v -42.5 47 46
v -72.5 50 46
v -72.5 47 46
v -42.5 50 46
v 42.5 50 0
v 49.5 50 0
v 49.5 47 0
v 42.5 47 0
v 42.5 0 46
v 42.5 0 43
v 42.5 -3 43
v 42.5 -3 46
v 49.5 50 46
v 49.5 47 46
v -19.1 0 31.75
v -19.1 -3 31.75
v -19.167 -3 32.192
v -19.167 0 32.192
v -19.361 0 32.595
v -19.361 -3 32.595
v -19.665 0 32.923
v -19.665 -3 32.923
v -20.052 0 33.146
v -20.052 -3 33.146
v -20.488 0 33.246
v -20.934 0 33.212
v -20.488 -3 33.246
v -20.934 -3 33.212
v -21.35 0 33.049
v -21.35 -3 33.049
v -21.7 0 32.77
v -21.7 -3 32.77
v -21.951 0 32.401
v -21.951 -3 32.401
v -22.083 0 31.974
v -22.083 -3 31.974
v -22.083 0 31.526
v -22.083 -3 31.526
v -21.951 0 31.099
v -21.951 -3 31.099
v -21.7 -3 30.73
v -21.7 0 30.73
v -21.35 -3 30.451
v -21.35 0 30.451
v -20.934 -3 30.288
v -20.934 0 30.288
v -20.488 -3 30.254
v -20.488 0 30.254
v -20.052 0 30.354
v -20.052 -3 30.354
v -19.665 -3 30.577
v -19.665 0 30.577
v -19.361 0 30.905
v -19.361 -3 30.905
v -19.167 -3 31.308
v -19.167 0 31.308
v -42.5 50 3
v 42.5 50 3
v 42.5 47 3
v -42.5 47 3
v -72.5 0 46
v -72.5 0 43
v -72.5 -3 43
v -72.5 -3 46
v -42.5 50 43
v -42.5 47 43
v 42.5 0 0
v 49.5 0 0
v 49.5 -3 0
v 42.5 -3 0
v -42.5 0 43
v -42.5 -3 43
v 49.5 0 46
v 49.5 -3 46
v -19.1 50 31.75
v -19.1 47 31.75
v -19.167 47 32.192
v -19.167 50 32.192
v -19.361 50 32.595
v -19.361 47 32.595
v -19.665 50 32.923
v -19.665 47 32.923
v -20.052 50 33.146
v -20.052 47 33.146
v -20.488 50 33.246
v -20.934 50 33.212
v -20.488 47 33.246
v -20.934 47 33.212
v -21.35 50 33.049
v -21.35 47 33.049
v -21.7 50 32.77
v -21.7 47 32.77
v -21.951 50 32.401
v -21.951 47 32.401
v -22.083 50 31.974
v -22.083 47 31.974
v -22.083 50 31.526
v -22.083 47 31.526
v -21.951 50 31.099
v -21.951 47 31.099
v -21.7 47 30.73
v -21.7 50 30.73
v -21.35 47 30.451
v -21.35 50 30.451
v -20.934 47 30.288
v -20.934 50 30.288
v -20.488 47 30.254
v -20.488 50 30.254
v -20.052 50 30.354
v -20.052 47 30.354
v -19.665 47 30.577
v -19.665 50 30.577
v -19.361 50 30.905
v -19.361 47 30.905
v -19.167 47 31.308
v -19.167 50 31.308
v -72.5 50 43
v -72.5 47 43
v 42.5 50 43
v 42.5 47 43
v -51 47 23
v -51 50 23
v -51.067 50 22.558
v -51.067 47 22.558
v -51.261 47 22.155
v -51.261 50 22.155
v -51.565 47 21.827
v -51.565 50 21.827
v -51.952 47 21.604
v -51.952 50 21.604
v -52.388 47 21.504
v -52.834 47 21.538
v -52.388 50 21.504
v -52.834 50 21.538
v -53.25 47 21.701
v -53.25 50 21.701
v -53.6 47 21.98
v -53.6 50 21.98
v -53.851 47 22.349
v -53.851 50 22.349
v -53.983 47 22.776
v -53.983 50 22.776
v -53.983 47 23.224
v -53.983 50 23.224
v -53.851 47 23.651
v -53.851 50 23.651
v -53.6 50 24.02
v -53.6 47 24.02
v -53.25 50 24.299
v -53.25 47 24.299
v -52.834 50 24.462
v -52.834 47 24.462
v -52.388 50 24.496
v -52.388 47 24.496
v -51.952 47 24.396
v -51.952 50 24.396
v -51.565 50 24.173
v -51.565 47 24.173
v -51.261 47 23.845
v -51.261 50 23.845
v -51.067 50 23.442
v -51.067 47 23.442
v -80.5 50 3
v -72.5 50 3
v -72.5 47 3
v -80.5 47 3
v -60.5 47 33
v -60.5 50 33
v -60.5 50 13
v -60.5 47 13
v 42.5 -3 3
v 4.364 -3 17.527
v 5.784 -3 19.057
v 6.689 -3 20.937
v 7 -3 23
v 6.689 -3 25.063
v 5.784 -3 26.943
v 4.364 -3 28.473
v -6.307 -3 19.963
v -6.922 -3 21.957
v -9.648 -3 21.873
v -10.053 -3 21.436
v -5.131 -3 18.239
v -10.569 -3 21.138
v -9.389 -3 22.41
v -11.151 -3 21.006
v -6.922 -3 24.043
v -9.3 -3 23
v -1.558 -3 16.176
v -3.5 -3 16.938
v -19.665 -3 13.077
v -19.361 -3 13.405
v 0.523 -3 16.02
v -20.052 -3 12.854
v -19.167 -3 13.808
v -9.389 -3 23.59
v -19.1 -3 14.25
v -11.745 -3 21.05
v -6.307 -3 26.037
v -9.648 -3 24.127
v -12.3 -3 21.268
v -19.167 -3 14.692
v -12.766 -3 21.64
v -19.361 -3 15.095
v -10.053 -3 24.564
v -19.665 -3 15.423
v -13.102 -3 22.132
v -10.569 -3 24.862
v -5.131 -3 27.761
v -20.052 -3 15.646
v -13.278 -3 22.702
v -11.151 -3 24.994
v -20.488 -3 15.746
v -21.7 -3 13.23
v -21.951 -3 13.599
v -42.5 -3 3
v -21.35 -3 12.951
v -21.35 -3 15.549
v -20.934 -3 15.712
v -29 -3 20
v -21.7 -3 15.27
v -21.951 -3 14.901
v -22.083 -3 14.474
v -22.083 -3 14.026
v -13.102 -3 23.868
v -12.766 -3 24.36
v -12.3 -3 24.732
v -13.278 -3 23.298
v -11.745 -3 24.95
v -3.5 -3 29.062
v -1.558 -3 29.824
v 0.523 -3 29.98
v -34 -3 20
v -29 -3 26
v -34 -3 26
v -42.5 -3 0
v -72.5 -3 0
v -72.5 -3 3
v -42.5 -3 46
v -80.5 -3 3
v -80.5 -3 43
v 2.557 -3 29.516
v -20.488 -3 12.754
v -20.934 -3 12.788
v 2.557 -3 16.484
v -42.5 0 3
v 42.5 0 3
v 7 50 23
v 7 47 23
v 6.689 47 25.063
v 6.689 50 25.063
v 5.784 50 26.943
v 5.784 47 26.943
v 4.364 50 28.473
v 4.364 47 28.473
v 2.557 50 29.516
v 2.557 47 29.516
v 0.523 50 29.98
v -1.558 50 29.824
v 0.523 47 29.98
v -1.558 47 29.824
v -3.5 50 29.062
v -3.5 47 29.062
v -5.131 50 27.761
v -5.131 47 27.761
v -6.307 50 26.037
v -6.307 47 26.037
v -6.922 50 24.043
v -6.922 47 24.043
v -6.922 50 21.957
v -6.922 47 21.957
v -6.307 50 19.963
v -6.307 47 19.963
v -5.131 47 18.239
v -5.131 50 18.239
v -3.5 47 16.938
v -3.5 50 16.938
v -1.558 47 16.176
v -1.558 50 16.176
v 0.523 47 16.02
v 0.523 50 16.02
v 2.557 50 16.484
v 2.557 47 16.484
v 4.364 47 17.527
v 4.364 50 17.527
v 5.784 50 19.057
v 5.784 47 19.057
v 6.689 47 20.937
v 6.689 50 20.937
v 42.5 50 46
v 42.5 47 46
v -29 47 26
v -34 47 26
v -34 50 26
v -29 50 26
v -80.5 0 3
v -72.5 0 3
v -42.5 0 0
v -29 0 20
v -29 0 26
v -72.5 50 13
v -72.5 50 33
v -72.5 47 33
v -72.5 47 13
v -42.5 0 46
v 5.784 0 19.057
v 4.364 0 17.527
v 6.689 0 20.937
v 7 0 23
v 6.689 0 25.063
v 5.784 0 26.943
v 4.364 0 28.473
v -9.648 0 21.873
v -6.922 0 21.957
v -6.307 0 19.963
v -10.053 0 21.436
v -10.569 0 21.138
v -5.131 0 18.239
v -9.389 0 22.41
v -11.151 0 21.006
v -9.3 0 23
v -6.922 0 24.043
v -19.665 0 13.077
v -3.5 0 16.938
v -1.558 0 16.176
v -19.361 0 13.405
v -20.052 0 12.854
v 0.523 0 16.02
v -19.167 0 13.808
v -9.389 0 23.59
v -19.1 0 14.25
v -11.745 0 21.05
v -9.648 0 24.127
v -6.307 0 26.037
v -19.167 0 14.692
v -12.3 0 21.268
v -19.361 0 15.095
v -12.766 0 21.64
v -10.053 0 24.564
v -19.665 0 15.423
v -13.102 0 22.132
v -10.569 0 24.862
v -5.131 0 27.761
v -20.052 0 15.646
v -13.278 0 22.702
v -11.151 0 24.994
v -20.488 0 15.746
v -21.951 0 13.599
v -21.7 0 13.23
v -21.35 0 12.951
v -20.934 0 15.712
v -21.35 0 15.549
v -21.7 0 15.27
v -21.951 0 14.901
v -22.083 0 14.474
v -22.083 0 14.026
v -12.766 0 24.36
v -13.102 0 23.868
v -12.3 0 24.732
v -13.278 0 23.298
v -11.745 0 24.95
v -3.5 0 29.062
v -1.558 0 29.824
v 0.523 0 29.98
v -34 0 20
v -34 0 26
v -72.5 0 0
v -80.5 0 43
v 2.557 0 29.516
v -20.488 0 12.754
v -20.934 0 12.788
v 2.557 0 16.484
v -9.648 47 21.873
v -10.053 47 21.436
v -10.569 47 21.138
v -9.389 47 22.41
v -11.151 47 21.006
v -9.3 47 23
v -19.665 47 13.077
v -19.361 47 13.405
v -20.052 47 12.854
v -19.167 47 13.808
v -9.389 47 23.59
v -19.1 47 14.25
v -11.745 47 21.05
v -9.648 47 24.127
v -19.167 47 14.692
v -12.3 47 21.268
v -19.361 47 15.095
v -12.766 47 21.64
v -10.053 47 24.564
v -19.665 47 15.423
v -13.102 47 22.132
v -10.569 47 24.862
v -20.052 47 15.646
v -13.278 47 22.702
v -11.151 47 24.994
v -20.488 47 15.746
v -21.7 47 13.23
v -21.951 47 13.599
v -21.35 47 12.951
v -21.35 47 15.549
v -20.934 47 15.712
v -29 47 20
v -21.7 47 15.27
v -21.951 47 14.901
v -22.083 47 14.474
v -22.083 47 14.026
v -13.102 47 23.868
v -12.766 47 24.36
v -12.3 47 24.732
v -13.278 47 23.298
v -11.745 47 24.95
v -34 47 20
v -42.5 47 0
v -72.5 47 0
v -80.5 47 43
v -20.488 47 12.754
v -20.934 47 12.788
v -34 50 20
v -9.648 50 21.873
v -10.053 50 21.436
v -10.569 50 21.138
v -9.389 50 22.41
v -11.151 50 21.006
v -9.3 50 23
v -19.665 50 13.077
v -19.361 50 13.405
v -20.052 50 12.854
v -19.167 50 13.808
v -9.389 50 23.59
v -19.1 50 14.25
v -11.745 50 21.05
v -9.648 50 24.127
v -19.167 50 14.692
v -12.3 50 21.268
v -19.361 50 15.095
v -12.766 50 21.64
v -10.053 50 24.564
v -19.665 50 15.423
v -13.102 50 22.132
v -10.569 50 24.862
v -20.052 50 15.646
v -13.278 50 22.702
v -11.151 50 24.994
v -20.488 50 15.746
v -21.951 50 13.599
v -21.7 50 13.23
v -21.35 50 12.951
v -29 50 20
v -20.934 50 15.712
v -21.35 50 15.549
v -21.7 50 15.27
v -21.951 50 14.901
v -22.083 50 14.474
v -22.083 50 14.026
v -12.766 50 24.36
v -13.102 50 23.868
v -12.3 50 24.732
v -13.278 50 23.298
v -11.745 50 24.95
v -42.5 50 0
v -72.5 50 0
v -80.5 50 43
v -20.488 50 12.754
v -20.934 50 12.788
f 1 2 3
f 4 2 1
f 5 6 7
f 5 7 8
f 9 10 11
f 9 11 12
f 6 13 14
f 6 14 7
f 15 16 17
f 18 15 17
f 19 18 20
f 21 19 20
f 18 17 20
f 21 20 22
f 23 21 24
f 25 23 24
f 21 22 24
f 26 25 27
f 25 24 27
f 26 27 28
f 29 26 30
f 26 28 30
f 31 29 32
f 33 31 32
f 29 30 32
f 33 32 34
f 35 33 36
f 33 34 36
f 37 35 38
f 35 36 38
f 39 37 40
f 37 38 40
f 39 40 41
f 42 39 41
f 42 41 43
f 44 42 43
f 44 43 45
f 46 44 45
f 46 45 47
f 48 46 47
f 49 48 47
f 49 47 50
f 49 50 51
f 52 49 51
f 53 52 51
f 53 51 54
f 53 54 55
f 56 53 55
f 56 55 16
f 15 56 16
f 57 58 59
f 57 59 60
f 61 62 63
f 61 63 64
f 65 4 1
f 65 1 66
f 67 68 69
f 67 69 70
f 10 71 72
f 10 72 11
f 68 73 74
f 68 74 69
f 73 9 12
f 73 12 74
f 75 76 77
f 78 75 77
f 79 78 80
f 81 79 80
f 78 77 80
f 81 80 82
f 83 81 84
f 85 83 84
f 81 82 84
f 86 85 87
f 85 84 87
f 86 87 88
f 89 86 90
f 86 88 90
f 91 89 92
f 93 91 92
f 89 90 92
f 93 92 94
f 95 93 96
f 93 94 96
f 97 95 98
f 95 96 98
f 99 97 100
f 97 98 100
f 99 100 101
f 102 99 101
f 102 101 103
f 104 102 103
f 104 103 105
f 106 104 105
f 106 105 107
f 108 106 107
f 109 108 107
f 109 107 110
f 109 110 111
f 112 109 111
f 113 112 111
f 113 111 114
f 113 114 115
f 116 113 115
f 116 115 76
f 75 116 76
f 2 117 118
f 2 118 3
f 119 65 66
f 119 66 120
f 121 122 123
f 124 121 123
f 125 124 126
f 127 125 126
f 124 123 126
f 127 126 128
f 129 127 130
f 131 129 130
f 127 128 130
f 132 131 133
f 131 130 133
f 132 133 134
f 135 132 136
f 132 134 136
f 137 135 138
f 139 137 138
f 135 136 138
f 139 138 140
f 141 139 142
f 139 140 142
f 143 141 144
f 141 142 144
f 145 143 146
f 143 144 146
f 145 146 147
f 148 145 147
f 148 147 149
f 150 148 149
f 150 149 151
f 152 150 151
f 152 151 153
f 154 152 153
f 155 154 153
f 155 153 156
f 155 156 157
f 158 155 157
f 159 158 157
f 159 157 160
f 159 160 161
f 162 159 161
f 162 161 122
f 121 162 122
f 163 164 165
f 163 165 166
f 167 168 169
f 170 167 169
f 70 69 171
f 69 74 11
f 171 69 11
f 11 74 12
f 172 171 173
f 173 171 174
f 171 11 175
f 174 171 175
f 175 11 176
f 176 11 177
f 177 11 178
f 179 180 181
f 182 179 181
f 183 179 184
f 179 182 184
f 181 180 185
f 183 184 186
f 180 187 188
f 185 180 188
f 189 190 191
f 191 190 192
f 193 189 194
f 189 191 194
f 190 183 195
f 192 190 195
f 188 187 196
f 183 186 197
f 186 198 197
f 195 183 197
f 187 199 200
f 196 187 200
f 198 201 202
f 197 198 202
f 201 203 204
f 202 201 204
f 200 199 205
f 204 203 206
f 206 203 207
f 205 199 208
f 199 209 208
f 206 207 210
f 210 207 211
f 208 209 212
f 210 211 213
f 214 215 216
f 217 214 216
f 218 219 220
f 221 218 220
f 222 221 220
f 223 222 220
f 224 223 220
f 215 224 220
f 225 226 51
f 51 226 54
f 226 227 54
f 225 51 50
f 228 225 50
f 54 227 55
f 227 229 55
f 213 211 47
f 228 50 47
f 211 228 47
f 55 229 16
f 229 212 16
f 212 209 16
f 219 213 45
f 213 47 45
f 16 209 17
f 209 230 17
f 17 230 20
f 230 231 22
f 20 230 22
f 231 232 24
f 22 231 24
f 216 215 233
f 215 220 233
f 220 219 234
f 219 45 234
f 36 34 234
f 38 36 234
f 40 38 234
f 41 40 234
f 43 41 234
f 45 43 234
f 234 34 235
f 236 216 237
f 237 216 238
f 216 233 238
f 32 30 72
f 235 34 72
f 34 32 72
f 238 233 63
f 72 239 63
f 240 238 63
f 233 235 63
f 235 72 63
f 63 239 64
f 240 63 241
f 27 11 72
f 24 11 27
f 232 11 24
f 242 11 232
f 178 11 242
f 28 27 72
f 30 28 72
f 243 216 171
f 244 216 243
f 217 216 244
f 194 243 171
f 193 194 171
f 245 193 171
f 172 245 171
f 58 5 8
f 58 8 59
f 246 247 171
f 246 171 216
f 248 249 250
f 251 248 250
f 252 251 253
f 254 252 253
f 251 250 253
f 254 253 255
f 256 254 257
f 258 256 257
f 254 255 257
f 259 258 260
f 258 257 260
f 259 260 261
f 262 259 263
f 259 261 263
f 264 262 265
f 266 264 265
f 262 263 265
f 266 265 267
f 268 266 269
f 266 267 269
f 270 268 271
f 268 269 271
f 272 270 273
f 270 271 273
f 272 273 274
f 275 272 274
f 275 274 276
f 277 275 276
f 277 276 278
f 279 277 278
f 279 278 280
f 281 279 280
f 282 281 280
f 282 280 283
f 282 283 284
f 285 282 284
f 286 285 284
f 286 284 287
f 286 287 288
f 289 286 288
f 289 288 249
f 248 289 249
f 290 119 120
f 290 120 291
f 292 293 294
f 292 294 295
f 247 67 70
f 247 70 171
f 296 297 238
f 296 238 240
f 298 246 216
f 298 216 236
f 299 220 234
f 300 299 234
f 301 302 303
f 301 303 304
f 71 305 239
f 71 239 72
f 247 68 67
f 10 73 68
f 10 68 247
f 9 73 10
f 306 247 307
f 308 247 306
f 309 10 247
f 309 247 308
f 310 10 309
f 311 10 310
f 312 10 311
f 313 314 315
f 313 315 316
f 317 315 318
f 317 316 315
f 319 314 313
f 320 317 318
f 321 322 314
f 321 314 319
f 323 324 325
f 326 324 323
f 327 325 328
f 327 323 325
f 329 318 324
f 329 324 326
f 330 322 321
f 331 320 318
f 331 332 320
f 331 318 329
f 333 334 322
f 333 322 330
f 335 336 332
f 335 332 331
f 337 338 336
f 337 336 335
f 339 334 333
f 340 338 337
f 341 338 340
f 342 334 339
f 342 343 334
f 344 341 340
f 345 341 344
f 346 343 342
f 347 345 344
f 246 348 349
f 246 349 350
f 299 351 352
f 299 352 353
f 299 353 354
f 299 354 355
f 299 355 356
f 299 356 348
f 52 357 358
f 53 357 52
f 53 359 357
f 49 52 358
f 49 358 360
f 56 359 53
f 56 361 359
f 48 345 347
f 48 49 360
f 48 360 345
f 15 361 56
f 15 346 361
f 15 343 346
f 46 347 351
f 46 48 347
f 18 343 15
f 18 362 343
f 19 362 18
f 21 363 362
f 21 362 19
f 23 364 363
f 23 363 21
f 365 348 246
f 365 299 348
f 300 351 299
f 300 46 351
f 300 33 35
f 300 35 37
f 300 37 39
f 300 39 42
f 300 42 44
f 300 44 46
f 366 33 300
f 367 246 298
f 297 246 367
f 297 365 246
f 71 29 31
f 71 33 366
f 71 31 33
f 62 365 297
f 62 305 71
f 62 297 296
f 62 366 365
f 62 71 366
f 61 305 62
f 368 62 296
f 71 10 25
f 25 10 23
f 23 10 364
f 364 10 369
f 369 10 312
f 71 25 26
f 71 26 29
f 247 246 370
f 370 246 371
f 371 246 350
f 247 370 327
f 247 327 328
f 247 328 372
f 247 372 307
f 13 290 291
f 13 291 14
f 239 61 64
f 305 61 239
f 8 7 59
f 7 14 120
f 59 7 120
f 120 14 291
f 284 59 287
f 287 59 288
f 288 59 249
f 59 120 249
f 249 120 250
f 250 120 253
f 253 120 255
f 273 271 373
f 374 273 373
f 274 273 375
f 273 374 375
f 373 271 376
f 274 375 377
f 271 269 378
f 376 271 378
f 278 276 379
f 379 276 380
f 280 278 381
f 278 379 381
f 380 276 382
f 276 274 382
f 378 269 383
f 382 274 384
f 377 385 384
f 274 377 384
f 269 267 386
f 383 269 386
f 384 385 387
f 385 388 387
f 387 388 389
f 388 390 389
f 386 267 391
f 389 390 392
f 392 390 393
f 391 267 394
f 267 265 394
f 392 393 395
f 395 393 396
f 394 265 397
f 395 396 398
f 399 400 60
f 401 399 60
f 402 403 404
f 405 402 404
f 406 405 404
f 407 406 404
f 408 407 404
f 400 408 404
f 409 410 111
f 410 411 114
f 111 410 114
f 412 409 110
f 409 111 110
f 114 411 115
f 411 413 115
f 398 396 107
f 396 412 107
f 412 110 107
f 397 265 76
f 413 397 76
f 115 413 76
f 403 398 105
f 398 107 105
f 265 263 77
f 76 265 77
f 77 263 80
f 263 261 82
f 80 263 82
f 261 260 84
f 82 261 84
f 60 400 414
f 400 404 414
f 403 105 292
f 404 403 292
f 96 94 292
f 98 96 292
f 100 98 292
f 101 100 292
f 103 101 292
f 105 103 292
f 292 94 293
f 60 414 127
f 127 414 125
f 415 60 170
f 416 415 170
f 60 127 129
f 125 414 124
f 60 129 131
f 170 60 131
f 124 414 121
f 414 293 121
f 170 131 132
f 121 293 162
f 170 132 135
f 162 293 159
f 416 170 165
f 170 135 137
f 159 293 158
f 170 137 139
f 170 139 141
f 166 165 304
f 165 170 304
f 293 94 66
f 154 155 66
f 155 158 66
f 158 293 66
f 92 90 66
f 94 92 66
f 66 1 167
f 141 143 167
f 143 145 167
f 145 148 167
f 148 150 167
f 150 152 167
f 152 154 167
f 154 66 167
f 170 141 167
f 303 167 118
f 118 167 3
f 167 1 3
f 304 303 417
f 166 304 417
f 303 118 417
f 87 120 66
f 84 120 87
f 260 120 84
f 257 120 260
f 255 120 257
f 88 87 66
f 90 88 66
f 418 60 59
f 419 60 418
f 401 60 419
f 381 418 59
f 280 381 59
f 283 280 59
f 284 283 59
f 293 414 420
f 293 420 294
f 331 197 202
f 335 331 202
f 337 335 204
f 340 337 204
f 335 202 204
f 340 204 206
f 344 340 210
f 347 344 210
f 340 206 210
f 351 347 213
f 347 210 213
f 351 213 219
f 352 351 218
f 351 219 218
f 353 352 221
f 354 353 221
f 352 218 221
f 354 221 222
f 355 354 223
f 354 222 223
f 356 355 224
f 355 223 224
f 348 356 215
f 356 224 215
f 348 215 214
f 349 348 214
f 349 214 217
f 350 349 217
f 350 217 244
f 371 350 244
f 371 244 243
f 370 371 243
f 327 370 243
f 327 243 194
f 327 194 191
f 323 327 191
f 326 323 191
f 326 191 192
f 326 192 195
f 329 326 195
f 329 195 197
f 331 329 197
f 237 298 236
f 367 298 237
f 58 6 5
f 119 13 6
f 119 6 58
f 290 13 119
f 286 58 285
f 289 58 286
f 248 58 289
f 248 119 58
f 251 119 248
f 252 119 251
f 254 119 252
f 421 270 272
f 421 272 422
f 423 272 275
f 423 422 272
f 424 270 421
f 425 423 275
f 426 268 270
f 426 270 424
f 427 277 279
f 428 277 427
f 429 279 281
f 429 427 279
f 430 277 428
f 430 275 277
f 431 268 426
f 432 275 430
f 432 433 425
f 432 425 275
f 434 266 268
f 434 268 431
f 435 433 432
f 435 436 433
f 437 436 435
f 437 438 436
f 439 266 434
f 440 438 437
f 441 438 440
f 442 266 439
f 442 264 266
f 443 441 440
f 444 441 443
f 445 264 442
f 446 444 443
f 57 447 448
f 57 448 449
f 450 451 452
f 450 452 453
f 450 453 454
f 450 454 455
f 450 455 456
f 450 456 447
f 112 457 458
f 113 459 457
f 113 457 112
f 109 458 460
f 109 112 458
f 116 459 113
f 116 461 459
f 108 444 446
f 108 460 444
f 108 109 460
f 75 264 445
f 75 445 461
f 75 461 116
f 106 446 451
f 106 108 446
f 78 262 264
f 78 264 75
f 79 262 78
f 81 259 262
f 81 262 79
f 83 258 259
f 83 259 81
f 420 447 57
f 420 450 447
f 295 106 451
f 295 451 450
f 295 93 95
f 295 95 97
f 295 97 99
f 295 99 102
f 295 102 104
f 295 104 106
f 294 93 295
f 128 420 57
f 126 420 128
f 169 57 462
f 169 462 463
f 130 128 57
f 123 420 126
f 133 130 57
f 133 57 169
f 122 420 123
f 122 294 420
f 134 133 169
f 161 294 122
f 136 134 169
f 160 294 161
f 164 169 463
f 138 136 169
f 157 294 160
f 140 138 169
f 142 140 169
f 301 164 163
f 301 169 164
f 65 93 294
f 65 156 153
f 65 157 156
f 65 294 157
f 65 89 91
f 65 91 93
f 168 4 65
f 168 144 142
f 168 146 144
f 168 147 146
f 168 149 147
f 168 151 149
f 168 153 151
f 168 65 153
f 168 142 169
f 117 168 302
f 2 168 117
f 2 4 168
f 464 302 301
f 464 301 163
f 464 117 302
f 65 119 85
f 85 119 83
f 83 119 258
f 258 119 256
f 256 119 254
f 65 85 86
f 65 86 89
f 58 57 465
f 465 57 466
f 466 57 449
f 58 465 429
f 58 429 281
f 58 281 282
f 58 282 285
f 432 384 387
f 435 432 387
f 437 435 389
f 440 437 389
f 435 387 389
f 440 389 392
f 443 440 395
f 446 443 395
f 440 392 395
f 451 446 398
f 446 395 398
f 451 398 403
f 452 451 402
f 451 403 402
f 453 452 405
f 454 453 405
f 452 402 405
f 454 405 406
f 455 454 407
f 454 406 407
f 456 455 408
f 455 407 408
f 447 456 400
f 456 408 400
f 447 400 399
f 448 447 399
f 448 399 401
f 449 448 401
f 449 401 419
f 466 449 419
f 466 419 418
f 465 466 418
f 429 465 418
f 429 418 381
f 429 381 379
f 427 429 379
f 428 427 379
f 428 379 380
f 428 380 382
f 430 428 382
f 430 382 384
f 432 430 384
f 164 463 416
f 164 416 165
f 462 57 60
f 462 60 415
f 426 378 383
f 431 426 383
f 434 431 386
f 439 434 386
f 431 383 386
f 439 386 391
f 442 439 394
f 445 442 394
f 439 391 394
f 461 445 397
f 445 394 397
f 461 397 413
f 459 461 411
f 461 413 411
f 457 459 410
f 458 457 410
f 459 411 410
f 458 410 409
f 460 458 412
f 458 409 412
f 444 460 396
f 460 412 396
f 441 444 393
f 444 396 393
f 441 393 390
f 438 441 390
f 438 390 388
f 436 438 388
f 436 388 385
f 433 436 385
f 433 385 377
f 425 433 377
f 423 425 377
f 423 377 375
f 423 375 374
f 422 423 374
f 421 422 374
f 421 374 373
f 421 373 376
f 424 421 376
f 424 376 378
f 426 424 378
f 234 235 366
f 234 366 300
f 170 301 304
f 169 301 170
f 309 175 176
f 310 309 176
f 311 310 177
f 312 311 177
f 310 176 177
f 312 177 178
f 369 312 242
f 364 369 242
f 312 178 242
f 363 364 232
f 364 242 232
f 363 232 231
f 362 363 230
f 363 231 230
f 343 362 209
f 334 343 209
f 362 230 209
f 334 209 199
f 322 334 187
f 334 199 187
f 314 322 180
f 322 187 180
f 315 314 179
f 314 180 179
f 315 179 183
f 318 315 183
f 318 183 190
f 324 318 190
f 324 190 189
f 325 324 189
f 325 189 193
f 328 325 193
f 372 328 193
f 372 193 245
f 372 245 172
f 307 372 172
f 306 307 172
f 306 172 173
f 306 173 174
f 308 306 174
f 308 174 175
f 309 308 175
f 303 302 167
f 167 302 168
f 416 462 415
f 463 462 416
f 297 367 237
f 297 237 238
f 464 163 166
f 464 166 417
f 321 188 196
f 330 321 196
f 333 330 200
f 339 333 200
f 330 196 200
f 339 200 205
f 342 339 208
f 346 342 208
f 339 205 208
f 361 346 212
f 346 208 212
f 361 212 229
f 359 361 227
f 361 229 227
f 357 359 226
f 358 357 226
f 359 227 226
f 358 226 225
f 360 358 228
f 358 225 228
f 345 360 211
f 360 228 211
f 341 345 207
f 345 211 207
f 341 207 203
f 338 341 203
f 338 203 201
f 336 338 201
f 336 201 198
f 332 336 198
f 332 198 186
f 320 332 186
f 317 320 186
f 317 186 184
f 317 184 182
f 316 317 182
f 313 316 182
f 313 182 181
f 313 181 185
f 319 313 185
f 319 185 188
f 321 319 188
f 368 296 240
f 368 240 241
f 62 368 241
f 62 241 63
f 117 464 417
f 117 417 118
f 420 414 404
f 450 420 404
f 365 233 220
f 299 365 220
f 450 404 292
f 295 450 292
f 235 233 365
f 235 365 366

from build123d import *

# Parameters (mm, degrees)
PAD003_DEPTH    = 3
SKETCH013_R     = 7
SKETCH013_R_2   = 2
SKETCH013_R_3   = 1.5
SKETCH013_W     = 5
SKETCH013_H     = 6
POCKET009_DEPTH = 3.001
SKETCH015_R     = 1.5
SKETCH015_W     = 12
SKETCH015_H     = 20
POCKET_DEPTH    = 3.001


with BuildPart() as ladoderechomotor:
    # Sketch012 → Pad003 (new body)
    with BuildSketch(Plane.XZ):
        Polygon((-80.5, 43), (-72.5, 43), (-72.5, 46), (-42.5, 46), (-42.5, 43), (42.5, 43), (42.5, 46), (49.5, 46), (49.5, 0), (42.5, 0), (42.5, 3), (-42.5, 3), (-42.5, 0), (-72.5, 0), (-72.5, 3), (-80.5, 3), align=None)
    extrude(amount=PAD003_DEPTH)

    # Sketch013 → Pocket009 (cut, through all)
    with BuildSketch(Plane.XZ.offset(3)):
        with Locations((0, 23)):
            Circle(SKETCH013_R)
        with Locations((-11.3, 23)):
            Circle(SKETCH013_R_2)
        with Locations((-20.6, 31.75)):
            Circle(SKETCH013_R_3)
        with Locations((-20.6, 14.25)):
            Circle(SKETCH013_R_3)
        with Locations((-31.5, 23)):
            Rectangle(SKETCH013_W, SKETCH013_H)
    extrude(amount=-POCKET009_DEPTH, mode=Mode.SUBTRACT)


with BuildPart() as ladoizquierdollaveled:
    # Clone base: copy of LadoDerechoMotor
    add(ladoderechomotor.part)


with BuildPart() as ladoizquierdollaveled_1:
    # Clone placement: moved
    add(ladoizquierdollaveled.part.moved(Location((0, 50, 0))))

    # Sketch015 → Pocket (cut, through all)
    with BuildSketch(Plane(origin=(0, 50, 0), x_dir=(1, 0, 0), z_dir=(0, 1, 0))):
        with Locations((-52.5, -23)):
            Circle(SKETCH015_R)
        with Locations((-66.5, -23)):
            Rectangle(SKETCH015_W, SKETCH015_H)
    extrude(amount=-POCKET_DEPTH, mode=Mode.SUBTRACT)


solid = Compound([ladoderechomotor.part, ladoizquierdollaveled_1.part])
